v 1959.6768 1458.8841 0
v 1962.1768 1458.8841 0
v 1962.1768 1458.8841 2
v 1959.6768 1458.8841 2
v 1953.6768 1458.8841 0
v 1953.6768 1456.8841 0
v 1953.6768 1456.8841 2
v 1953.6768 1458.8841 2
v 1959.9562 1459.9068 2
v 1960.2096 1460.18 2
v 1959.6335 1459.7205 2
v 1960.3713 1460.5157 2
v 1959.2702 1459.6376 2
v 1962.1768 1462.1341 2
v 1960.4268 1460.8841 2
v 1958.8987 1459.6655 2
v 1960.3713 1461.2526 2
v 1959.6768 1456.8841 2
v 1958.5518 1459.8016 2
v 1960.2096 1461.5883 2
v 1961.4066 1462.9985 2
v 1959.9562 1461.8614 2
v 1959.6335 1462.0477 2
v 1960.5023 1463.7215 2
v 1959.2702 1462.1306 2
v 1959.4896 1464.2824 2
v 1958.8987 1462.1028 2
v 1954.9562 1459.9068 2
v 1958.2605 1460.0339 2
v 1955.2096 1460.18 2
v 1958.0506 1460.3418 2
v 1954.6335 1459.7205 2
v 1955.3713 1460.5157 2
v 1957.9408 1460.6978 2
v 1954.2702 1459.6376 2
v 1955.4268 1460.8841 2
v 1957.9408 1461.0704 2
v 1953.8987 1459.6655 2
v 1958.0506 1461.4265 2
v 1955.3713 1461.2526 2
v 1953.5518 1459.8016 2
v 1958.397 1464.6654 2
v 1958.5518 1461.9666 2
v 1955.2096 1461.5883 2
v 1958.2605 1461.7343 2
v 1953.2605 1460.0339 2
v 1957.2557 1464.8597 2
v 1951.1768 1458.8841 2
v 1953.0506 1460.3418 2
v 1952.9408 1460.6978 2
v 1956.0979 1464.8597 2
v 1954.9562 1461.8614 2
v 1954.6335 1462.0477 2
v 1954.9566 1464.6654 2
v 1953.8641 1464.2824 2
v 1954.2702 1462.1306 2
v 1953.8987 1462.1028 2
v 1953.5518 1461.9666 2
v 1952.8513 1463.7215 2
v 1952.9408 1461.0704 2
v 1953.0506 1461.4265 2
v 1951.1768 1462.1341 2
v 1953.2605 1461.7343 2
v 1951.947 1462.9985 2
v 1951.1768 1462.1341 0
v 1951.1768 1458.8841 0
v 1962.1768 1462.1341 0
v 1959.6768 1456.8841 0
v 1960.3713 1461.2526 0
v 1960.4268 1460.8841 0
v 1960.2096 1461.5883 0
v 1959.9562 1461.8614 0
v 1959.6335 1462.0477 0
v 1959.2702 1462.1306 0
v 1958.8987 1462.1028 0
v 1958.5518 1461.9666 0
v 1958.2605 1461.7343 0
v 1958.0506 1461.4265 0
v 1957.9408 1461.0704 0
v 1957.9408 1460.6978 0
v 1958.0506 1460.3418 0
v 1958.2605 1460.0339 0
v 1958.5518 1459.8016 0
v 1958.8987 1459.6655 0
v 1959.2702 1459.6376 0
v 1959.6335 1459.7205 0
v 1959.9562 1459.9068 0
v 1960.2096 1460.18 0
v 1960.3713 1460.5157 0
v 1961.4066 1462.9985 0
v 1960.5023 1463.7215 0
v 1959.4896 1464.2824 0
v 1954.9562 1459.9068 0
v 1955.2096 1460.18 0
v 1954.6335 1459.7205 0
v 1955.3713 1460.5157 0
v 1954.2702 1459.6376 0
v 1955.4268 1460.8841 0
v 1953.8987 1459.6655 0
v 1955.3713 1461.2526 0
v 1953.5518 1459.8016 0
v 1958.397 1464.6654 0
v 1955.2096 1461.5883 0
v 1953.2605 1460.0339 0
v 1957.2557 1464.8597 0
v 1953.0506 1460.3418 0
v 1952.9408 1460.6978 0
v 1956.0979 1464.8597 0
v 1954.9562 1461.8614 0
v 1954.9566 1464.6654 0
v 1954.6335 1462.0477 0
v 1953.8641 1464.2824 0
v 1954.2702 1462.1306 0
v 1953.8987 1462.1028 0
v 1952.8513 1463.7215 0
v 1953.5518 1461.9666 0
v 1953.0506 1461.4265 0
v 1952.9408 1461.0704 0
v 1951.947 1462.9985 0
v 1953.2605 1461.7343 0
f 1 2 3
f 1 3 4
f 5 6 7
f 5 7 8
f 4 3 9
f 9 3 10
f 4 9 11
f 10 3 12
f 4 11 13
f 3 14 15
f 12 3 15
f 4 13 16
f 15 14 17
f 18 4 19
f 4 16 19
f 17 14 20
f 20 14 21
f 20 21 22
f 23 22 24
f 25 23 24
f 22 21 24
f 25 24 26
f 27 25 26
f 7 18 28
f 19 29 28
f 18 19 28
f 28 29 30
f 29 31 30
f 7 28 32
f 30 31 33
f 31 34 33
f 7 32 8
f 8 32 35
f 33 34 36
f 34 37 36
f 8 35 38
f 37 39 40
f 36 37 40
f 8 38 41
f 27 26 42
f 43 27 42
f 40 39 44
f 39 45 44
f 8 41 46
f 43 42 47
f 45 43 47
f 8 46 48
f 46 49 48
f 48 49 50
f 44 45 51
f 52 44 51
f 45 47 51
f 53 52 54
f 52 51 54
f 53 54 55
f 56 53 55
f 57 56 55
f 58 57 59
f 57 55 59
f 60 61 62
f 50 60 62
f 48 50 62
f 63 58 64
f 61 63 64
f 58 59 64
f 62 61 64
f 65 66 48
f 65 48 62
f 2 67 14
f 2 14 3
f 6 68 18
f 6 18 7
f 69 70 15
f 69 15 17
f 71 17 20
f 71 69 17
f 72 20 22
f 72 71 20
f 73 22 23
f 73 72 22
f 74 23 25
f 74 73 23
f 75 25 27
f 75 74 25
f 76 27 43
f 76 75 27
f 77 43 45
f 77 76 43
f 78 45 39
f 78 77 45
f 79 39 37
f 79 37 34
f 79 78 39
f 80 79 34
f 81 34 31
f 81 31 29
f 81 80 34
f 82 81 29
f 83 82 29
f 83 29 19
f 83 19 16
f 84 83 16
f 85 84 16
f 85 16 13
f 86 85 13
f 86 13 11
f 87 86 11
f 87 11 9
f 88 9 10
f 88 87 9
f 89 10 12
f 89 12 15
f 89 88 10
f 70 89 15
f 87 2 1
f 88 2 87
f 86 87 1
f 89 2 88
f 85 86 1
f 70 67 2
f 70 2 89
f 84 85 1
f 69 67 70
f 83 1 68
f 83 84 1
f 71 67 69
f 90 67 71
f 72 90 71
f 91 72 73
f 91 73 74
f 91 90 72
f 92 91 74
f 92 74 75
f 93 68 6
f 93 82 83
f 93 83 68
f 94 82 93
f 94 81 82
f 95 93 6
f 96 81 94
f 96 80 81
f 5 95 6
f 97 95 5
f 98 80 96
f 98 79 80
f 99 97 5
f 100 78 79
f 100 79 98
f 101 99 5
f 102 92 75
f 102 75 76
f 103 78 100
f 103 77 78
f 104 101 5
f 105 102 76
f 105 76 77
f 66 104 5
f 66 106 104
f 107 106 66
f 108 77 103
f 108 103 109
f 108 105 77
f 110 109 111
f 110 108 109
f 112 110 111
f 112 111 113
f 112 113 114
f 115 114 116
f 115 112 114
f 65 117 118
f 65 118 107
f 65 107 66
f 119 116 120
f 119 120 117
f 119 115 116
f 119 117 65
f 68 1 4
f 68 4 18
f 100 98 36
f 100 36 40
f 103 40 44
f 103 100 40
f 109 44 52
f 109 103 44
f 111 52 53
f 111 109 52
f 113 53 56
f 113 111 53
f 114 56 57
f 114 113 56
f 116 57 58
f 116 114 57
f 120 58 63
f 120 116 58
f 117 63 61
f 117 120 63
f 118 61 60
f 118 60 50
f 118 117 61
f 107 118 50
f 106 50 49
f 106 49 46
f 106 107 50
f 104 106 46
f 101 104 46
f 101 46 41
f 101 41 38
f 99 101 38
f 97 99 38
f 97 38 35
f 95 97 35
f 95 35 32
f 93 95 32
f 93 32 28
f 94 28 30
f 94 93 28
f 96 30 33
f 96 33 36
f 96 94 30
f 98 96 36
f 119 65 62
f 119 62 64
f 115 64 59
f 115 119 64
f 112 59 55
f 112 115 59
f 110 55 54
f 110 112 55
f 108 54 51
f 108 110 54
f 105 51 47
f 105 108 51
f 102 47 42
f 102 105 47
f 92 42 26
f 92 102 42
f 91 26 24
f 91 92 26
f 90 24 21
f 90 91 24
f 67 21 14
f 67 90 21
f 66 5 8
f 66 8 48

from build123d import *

# Parameters (mm, degrees)
MODEL_R             = 1.25
BOSS_EXTRUDE1_DEPTH = 2


with BuildPart() as part:
    # Model → Boss-Extrude1 (new body)
    with BuildSketch(Plane.XY):
        with BuildLine():
            Line((1953.676808721, 1458.884115951), (1951.176808721, 1458.884115951))
            Line((1951.176808721, 1458.884115951), (1951.176808721, 1462.134115951))
            ThreePointArc((1951.176808721, 1462.134115951), (1956.676808721, 1464.884115951), (1962.176808721, 1462.134115951))
            Line((1962.176808721, 1462.134115951), (1962.176808721, 1458.884115951))
            Line((1962.176808721, 1458.884115951), (1959.676808721, 1458.884115951))
            Line((1959.676808721, 1458.884115951), (1959.676808721, 1456.884115951))
            Line((1959.676808721, 1456.884115951), (1953.676808721, 1456.884115951))
            Line((1953.676808721, 1456.884115951), (1953.676808721, 1458.884115951))
        make_face()
        with Locations((1959.176808721, 1460.884115951)):
            Circle(MODEL_R, mode=Mode.SUBTRACT)
        with Locations((1954.176808721, 1460.884115951)):
            Circle(MODEL_R, mode=Mode.SUBTRACT)
    extrude(amount=BOSS_EXTRUDE1_DEPTH)


solid = part.part
